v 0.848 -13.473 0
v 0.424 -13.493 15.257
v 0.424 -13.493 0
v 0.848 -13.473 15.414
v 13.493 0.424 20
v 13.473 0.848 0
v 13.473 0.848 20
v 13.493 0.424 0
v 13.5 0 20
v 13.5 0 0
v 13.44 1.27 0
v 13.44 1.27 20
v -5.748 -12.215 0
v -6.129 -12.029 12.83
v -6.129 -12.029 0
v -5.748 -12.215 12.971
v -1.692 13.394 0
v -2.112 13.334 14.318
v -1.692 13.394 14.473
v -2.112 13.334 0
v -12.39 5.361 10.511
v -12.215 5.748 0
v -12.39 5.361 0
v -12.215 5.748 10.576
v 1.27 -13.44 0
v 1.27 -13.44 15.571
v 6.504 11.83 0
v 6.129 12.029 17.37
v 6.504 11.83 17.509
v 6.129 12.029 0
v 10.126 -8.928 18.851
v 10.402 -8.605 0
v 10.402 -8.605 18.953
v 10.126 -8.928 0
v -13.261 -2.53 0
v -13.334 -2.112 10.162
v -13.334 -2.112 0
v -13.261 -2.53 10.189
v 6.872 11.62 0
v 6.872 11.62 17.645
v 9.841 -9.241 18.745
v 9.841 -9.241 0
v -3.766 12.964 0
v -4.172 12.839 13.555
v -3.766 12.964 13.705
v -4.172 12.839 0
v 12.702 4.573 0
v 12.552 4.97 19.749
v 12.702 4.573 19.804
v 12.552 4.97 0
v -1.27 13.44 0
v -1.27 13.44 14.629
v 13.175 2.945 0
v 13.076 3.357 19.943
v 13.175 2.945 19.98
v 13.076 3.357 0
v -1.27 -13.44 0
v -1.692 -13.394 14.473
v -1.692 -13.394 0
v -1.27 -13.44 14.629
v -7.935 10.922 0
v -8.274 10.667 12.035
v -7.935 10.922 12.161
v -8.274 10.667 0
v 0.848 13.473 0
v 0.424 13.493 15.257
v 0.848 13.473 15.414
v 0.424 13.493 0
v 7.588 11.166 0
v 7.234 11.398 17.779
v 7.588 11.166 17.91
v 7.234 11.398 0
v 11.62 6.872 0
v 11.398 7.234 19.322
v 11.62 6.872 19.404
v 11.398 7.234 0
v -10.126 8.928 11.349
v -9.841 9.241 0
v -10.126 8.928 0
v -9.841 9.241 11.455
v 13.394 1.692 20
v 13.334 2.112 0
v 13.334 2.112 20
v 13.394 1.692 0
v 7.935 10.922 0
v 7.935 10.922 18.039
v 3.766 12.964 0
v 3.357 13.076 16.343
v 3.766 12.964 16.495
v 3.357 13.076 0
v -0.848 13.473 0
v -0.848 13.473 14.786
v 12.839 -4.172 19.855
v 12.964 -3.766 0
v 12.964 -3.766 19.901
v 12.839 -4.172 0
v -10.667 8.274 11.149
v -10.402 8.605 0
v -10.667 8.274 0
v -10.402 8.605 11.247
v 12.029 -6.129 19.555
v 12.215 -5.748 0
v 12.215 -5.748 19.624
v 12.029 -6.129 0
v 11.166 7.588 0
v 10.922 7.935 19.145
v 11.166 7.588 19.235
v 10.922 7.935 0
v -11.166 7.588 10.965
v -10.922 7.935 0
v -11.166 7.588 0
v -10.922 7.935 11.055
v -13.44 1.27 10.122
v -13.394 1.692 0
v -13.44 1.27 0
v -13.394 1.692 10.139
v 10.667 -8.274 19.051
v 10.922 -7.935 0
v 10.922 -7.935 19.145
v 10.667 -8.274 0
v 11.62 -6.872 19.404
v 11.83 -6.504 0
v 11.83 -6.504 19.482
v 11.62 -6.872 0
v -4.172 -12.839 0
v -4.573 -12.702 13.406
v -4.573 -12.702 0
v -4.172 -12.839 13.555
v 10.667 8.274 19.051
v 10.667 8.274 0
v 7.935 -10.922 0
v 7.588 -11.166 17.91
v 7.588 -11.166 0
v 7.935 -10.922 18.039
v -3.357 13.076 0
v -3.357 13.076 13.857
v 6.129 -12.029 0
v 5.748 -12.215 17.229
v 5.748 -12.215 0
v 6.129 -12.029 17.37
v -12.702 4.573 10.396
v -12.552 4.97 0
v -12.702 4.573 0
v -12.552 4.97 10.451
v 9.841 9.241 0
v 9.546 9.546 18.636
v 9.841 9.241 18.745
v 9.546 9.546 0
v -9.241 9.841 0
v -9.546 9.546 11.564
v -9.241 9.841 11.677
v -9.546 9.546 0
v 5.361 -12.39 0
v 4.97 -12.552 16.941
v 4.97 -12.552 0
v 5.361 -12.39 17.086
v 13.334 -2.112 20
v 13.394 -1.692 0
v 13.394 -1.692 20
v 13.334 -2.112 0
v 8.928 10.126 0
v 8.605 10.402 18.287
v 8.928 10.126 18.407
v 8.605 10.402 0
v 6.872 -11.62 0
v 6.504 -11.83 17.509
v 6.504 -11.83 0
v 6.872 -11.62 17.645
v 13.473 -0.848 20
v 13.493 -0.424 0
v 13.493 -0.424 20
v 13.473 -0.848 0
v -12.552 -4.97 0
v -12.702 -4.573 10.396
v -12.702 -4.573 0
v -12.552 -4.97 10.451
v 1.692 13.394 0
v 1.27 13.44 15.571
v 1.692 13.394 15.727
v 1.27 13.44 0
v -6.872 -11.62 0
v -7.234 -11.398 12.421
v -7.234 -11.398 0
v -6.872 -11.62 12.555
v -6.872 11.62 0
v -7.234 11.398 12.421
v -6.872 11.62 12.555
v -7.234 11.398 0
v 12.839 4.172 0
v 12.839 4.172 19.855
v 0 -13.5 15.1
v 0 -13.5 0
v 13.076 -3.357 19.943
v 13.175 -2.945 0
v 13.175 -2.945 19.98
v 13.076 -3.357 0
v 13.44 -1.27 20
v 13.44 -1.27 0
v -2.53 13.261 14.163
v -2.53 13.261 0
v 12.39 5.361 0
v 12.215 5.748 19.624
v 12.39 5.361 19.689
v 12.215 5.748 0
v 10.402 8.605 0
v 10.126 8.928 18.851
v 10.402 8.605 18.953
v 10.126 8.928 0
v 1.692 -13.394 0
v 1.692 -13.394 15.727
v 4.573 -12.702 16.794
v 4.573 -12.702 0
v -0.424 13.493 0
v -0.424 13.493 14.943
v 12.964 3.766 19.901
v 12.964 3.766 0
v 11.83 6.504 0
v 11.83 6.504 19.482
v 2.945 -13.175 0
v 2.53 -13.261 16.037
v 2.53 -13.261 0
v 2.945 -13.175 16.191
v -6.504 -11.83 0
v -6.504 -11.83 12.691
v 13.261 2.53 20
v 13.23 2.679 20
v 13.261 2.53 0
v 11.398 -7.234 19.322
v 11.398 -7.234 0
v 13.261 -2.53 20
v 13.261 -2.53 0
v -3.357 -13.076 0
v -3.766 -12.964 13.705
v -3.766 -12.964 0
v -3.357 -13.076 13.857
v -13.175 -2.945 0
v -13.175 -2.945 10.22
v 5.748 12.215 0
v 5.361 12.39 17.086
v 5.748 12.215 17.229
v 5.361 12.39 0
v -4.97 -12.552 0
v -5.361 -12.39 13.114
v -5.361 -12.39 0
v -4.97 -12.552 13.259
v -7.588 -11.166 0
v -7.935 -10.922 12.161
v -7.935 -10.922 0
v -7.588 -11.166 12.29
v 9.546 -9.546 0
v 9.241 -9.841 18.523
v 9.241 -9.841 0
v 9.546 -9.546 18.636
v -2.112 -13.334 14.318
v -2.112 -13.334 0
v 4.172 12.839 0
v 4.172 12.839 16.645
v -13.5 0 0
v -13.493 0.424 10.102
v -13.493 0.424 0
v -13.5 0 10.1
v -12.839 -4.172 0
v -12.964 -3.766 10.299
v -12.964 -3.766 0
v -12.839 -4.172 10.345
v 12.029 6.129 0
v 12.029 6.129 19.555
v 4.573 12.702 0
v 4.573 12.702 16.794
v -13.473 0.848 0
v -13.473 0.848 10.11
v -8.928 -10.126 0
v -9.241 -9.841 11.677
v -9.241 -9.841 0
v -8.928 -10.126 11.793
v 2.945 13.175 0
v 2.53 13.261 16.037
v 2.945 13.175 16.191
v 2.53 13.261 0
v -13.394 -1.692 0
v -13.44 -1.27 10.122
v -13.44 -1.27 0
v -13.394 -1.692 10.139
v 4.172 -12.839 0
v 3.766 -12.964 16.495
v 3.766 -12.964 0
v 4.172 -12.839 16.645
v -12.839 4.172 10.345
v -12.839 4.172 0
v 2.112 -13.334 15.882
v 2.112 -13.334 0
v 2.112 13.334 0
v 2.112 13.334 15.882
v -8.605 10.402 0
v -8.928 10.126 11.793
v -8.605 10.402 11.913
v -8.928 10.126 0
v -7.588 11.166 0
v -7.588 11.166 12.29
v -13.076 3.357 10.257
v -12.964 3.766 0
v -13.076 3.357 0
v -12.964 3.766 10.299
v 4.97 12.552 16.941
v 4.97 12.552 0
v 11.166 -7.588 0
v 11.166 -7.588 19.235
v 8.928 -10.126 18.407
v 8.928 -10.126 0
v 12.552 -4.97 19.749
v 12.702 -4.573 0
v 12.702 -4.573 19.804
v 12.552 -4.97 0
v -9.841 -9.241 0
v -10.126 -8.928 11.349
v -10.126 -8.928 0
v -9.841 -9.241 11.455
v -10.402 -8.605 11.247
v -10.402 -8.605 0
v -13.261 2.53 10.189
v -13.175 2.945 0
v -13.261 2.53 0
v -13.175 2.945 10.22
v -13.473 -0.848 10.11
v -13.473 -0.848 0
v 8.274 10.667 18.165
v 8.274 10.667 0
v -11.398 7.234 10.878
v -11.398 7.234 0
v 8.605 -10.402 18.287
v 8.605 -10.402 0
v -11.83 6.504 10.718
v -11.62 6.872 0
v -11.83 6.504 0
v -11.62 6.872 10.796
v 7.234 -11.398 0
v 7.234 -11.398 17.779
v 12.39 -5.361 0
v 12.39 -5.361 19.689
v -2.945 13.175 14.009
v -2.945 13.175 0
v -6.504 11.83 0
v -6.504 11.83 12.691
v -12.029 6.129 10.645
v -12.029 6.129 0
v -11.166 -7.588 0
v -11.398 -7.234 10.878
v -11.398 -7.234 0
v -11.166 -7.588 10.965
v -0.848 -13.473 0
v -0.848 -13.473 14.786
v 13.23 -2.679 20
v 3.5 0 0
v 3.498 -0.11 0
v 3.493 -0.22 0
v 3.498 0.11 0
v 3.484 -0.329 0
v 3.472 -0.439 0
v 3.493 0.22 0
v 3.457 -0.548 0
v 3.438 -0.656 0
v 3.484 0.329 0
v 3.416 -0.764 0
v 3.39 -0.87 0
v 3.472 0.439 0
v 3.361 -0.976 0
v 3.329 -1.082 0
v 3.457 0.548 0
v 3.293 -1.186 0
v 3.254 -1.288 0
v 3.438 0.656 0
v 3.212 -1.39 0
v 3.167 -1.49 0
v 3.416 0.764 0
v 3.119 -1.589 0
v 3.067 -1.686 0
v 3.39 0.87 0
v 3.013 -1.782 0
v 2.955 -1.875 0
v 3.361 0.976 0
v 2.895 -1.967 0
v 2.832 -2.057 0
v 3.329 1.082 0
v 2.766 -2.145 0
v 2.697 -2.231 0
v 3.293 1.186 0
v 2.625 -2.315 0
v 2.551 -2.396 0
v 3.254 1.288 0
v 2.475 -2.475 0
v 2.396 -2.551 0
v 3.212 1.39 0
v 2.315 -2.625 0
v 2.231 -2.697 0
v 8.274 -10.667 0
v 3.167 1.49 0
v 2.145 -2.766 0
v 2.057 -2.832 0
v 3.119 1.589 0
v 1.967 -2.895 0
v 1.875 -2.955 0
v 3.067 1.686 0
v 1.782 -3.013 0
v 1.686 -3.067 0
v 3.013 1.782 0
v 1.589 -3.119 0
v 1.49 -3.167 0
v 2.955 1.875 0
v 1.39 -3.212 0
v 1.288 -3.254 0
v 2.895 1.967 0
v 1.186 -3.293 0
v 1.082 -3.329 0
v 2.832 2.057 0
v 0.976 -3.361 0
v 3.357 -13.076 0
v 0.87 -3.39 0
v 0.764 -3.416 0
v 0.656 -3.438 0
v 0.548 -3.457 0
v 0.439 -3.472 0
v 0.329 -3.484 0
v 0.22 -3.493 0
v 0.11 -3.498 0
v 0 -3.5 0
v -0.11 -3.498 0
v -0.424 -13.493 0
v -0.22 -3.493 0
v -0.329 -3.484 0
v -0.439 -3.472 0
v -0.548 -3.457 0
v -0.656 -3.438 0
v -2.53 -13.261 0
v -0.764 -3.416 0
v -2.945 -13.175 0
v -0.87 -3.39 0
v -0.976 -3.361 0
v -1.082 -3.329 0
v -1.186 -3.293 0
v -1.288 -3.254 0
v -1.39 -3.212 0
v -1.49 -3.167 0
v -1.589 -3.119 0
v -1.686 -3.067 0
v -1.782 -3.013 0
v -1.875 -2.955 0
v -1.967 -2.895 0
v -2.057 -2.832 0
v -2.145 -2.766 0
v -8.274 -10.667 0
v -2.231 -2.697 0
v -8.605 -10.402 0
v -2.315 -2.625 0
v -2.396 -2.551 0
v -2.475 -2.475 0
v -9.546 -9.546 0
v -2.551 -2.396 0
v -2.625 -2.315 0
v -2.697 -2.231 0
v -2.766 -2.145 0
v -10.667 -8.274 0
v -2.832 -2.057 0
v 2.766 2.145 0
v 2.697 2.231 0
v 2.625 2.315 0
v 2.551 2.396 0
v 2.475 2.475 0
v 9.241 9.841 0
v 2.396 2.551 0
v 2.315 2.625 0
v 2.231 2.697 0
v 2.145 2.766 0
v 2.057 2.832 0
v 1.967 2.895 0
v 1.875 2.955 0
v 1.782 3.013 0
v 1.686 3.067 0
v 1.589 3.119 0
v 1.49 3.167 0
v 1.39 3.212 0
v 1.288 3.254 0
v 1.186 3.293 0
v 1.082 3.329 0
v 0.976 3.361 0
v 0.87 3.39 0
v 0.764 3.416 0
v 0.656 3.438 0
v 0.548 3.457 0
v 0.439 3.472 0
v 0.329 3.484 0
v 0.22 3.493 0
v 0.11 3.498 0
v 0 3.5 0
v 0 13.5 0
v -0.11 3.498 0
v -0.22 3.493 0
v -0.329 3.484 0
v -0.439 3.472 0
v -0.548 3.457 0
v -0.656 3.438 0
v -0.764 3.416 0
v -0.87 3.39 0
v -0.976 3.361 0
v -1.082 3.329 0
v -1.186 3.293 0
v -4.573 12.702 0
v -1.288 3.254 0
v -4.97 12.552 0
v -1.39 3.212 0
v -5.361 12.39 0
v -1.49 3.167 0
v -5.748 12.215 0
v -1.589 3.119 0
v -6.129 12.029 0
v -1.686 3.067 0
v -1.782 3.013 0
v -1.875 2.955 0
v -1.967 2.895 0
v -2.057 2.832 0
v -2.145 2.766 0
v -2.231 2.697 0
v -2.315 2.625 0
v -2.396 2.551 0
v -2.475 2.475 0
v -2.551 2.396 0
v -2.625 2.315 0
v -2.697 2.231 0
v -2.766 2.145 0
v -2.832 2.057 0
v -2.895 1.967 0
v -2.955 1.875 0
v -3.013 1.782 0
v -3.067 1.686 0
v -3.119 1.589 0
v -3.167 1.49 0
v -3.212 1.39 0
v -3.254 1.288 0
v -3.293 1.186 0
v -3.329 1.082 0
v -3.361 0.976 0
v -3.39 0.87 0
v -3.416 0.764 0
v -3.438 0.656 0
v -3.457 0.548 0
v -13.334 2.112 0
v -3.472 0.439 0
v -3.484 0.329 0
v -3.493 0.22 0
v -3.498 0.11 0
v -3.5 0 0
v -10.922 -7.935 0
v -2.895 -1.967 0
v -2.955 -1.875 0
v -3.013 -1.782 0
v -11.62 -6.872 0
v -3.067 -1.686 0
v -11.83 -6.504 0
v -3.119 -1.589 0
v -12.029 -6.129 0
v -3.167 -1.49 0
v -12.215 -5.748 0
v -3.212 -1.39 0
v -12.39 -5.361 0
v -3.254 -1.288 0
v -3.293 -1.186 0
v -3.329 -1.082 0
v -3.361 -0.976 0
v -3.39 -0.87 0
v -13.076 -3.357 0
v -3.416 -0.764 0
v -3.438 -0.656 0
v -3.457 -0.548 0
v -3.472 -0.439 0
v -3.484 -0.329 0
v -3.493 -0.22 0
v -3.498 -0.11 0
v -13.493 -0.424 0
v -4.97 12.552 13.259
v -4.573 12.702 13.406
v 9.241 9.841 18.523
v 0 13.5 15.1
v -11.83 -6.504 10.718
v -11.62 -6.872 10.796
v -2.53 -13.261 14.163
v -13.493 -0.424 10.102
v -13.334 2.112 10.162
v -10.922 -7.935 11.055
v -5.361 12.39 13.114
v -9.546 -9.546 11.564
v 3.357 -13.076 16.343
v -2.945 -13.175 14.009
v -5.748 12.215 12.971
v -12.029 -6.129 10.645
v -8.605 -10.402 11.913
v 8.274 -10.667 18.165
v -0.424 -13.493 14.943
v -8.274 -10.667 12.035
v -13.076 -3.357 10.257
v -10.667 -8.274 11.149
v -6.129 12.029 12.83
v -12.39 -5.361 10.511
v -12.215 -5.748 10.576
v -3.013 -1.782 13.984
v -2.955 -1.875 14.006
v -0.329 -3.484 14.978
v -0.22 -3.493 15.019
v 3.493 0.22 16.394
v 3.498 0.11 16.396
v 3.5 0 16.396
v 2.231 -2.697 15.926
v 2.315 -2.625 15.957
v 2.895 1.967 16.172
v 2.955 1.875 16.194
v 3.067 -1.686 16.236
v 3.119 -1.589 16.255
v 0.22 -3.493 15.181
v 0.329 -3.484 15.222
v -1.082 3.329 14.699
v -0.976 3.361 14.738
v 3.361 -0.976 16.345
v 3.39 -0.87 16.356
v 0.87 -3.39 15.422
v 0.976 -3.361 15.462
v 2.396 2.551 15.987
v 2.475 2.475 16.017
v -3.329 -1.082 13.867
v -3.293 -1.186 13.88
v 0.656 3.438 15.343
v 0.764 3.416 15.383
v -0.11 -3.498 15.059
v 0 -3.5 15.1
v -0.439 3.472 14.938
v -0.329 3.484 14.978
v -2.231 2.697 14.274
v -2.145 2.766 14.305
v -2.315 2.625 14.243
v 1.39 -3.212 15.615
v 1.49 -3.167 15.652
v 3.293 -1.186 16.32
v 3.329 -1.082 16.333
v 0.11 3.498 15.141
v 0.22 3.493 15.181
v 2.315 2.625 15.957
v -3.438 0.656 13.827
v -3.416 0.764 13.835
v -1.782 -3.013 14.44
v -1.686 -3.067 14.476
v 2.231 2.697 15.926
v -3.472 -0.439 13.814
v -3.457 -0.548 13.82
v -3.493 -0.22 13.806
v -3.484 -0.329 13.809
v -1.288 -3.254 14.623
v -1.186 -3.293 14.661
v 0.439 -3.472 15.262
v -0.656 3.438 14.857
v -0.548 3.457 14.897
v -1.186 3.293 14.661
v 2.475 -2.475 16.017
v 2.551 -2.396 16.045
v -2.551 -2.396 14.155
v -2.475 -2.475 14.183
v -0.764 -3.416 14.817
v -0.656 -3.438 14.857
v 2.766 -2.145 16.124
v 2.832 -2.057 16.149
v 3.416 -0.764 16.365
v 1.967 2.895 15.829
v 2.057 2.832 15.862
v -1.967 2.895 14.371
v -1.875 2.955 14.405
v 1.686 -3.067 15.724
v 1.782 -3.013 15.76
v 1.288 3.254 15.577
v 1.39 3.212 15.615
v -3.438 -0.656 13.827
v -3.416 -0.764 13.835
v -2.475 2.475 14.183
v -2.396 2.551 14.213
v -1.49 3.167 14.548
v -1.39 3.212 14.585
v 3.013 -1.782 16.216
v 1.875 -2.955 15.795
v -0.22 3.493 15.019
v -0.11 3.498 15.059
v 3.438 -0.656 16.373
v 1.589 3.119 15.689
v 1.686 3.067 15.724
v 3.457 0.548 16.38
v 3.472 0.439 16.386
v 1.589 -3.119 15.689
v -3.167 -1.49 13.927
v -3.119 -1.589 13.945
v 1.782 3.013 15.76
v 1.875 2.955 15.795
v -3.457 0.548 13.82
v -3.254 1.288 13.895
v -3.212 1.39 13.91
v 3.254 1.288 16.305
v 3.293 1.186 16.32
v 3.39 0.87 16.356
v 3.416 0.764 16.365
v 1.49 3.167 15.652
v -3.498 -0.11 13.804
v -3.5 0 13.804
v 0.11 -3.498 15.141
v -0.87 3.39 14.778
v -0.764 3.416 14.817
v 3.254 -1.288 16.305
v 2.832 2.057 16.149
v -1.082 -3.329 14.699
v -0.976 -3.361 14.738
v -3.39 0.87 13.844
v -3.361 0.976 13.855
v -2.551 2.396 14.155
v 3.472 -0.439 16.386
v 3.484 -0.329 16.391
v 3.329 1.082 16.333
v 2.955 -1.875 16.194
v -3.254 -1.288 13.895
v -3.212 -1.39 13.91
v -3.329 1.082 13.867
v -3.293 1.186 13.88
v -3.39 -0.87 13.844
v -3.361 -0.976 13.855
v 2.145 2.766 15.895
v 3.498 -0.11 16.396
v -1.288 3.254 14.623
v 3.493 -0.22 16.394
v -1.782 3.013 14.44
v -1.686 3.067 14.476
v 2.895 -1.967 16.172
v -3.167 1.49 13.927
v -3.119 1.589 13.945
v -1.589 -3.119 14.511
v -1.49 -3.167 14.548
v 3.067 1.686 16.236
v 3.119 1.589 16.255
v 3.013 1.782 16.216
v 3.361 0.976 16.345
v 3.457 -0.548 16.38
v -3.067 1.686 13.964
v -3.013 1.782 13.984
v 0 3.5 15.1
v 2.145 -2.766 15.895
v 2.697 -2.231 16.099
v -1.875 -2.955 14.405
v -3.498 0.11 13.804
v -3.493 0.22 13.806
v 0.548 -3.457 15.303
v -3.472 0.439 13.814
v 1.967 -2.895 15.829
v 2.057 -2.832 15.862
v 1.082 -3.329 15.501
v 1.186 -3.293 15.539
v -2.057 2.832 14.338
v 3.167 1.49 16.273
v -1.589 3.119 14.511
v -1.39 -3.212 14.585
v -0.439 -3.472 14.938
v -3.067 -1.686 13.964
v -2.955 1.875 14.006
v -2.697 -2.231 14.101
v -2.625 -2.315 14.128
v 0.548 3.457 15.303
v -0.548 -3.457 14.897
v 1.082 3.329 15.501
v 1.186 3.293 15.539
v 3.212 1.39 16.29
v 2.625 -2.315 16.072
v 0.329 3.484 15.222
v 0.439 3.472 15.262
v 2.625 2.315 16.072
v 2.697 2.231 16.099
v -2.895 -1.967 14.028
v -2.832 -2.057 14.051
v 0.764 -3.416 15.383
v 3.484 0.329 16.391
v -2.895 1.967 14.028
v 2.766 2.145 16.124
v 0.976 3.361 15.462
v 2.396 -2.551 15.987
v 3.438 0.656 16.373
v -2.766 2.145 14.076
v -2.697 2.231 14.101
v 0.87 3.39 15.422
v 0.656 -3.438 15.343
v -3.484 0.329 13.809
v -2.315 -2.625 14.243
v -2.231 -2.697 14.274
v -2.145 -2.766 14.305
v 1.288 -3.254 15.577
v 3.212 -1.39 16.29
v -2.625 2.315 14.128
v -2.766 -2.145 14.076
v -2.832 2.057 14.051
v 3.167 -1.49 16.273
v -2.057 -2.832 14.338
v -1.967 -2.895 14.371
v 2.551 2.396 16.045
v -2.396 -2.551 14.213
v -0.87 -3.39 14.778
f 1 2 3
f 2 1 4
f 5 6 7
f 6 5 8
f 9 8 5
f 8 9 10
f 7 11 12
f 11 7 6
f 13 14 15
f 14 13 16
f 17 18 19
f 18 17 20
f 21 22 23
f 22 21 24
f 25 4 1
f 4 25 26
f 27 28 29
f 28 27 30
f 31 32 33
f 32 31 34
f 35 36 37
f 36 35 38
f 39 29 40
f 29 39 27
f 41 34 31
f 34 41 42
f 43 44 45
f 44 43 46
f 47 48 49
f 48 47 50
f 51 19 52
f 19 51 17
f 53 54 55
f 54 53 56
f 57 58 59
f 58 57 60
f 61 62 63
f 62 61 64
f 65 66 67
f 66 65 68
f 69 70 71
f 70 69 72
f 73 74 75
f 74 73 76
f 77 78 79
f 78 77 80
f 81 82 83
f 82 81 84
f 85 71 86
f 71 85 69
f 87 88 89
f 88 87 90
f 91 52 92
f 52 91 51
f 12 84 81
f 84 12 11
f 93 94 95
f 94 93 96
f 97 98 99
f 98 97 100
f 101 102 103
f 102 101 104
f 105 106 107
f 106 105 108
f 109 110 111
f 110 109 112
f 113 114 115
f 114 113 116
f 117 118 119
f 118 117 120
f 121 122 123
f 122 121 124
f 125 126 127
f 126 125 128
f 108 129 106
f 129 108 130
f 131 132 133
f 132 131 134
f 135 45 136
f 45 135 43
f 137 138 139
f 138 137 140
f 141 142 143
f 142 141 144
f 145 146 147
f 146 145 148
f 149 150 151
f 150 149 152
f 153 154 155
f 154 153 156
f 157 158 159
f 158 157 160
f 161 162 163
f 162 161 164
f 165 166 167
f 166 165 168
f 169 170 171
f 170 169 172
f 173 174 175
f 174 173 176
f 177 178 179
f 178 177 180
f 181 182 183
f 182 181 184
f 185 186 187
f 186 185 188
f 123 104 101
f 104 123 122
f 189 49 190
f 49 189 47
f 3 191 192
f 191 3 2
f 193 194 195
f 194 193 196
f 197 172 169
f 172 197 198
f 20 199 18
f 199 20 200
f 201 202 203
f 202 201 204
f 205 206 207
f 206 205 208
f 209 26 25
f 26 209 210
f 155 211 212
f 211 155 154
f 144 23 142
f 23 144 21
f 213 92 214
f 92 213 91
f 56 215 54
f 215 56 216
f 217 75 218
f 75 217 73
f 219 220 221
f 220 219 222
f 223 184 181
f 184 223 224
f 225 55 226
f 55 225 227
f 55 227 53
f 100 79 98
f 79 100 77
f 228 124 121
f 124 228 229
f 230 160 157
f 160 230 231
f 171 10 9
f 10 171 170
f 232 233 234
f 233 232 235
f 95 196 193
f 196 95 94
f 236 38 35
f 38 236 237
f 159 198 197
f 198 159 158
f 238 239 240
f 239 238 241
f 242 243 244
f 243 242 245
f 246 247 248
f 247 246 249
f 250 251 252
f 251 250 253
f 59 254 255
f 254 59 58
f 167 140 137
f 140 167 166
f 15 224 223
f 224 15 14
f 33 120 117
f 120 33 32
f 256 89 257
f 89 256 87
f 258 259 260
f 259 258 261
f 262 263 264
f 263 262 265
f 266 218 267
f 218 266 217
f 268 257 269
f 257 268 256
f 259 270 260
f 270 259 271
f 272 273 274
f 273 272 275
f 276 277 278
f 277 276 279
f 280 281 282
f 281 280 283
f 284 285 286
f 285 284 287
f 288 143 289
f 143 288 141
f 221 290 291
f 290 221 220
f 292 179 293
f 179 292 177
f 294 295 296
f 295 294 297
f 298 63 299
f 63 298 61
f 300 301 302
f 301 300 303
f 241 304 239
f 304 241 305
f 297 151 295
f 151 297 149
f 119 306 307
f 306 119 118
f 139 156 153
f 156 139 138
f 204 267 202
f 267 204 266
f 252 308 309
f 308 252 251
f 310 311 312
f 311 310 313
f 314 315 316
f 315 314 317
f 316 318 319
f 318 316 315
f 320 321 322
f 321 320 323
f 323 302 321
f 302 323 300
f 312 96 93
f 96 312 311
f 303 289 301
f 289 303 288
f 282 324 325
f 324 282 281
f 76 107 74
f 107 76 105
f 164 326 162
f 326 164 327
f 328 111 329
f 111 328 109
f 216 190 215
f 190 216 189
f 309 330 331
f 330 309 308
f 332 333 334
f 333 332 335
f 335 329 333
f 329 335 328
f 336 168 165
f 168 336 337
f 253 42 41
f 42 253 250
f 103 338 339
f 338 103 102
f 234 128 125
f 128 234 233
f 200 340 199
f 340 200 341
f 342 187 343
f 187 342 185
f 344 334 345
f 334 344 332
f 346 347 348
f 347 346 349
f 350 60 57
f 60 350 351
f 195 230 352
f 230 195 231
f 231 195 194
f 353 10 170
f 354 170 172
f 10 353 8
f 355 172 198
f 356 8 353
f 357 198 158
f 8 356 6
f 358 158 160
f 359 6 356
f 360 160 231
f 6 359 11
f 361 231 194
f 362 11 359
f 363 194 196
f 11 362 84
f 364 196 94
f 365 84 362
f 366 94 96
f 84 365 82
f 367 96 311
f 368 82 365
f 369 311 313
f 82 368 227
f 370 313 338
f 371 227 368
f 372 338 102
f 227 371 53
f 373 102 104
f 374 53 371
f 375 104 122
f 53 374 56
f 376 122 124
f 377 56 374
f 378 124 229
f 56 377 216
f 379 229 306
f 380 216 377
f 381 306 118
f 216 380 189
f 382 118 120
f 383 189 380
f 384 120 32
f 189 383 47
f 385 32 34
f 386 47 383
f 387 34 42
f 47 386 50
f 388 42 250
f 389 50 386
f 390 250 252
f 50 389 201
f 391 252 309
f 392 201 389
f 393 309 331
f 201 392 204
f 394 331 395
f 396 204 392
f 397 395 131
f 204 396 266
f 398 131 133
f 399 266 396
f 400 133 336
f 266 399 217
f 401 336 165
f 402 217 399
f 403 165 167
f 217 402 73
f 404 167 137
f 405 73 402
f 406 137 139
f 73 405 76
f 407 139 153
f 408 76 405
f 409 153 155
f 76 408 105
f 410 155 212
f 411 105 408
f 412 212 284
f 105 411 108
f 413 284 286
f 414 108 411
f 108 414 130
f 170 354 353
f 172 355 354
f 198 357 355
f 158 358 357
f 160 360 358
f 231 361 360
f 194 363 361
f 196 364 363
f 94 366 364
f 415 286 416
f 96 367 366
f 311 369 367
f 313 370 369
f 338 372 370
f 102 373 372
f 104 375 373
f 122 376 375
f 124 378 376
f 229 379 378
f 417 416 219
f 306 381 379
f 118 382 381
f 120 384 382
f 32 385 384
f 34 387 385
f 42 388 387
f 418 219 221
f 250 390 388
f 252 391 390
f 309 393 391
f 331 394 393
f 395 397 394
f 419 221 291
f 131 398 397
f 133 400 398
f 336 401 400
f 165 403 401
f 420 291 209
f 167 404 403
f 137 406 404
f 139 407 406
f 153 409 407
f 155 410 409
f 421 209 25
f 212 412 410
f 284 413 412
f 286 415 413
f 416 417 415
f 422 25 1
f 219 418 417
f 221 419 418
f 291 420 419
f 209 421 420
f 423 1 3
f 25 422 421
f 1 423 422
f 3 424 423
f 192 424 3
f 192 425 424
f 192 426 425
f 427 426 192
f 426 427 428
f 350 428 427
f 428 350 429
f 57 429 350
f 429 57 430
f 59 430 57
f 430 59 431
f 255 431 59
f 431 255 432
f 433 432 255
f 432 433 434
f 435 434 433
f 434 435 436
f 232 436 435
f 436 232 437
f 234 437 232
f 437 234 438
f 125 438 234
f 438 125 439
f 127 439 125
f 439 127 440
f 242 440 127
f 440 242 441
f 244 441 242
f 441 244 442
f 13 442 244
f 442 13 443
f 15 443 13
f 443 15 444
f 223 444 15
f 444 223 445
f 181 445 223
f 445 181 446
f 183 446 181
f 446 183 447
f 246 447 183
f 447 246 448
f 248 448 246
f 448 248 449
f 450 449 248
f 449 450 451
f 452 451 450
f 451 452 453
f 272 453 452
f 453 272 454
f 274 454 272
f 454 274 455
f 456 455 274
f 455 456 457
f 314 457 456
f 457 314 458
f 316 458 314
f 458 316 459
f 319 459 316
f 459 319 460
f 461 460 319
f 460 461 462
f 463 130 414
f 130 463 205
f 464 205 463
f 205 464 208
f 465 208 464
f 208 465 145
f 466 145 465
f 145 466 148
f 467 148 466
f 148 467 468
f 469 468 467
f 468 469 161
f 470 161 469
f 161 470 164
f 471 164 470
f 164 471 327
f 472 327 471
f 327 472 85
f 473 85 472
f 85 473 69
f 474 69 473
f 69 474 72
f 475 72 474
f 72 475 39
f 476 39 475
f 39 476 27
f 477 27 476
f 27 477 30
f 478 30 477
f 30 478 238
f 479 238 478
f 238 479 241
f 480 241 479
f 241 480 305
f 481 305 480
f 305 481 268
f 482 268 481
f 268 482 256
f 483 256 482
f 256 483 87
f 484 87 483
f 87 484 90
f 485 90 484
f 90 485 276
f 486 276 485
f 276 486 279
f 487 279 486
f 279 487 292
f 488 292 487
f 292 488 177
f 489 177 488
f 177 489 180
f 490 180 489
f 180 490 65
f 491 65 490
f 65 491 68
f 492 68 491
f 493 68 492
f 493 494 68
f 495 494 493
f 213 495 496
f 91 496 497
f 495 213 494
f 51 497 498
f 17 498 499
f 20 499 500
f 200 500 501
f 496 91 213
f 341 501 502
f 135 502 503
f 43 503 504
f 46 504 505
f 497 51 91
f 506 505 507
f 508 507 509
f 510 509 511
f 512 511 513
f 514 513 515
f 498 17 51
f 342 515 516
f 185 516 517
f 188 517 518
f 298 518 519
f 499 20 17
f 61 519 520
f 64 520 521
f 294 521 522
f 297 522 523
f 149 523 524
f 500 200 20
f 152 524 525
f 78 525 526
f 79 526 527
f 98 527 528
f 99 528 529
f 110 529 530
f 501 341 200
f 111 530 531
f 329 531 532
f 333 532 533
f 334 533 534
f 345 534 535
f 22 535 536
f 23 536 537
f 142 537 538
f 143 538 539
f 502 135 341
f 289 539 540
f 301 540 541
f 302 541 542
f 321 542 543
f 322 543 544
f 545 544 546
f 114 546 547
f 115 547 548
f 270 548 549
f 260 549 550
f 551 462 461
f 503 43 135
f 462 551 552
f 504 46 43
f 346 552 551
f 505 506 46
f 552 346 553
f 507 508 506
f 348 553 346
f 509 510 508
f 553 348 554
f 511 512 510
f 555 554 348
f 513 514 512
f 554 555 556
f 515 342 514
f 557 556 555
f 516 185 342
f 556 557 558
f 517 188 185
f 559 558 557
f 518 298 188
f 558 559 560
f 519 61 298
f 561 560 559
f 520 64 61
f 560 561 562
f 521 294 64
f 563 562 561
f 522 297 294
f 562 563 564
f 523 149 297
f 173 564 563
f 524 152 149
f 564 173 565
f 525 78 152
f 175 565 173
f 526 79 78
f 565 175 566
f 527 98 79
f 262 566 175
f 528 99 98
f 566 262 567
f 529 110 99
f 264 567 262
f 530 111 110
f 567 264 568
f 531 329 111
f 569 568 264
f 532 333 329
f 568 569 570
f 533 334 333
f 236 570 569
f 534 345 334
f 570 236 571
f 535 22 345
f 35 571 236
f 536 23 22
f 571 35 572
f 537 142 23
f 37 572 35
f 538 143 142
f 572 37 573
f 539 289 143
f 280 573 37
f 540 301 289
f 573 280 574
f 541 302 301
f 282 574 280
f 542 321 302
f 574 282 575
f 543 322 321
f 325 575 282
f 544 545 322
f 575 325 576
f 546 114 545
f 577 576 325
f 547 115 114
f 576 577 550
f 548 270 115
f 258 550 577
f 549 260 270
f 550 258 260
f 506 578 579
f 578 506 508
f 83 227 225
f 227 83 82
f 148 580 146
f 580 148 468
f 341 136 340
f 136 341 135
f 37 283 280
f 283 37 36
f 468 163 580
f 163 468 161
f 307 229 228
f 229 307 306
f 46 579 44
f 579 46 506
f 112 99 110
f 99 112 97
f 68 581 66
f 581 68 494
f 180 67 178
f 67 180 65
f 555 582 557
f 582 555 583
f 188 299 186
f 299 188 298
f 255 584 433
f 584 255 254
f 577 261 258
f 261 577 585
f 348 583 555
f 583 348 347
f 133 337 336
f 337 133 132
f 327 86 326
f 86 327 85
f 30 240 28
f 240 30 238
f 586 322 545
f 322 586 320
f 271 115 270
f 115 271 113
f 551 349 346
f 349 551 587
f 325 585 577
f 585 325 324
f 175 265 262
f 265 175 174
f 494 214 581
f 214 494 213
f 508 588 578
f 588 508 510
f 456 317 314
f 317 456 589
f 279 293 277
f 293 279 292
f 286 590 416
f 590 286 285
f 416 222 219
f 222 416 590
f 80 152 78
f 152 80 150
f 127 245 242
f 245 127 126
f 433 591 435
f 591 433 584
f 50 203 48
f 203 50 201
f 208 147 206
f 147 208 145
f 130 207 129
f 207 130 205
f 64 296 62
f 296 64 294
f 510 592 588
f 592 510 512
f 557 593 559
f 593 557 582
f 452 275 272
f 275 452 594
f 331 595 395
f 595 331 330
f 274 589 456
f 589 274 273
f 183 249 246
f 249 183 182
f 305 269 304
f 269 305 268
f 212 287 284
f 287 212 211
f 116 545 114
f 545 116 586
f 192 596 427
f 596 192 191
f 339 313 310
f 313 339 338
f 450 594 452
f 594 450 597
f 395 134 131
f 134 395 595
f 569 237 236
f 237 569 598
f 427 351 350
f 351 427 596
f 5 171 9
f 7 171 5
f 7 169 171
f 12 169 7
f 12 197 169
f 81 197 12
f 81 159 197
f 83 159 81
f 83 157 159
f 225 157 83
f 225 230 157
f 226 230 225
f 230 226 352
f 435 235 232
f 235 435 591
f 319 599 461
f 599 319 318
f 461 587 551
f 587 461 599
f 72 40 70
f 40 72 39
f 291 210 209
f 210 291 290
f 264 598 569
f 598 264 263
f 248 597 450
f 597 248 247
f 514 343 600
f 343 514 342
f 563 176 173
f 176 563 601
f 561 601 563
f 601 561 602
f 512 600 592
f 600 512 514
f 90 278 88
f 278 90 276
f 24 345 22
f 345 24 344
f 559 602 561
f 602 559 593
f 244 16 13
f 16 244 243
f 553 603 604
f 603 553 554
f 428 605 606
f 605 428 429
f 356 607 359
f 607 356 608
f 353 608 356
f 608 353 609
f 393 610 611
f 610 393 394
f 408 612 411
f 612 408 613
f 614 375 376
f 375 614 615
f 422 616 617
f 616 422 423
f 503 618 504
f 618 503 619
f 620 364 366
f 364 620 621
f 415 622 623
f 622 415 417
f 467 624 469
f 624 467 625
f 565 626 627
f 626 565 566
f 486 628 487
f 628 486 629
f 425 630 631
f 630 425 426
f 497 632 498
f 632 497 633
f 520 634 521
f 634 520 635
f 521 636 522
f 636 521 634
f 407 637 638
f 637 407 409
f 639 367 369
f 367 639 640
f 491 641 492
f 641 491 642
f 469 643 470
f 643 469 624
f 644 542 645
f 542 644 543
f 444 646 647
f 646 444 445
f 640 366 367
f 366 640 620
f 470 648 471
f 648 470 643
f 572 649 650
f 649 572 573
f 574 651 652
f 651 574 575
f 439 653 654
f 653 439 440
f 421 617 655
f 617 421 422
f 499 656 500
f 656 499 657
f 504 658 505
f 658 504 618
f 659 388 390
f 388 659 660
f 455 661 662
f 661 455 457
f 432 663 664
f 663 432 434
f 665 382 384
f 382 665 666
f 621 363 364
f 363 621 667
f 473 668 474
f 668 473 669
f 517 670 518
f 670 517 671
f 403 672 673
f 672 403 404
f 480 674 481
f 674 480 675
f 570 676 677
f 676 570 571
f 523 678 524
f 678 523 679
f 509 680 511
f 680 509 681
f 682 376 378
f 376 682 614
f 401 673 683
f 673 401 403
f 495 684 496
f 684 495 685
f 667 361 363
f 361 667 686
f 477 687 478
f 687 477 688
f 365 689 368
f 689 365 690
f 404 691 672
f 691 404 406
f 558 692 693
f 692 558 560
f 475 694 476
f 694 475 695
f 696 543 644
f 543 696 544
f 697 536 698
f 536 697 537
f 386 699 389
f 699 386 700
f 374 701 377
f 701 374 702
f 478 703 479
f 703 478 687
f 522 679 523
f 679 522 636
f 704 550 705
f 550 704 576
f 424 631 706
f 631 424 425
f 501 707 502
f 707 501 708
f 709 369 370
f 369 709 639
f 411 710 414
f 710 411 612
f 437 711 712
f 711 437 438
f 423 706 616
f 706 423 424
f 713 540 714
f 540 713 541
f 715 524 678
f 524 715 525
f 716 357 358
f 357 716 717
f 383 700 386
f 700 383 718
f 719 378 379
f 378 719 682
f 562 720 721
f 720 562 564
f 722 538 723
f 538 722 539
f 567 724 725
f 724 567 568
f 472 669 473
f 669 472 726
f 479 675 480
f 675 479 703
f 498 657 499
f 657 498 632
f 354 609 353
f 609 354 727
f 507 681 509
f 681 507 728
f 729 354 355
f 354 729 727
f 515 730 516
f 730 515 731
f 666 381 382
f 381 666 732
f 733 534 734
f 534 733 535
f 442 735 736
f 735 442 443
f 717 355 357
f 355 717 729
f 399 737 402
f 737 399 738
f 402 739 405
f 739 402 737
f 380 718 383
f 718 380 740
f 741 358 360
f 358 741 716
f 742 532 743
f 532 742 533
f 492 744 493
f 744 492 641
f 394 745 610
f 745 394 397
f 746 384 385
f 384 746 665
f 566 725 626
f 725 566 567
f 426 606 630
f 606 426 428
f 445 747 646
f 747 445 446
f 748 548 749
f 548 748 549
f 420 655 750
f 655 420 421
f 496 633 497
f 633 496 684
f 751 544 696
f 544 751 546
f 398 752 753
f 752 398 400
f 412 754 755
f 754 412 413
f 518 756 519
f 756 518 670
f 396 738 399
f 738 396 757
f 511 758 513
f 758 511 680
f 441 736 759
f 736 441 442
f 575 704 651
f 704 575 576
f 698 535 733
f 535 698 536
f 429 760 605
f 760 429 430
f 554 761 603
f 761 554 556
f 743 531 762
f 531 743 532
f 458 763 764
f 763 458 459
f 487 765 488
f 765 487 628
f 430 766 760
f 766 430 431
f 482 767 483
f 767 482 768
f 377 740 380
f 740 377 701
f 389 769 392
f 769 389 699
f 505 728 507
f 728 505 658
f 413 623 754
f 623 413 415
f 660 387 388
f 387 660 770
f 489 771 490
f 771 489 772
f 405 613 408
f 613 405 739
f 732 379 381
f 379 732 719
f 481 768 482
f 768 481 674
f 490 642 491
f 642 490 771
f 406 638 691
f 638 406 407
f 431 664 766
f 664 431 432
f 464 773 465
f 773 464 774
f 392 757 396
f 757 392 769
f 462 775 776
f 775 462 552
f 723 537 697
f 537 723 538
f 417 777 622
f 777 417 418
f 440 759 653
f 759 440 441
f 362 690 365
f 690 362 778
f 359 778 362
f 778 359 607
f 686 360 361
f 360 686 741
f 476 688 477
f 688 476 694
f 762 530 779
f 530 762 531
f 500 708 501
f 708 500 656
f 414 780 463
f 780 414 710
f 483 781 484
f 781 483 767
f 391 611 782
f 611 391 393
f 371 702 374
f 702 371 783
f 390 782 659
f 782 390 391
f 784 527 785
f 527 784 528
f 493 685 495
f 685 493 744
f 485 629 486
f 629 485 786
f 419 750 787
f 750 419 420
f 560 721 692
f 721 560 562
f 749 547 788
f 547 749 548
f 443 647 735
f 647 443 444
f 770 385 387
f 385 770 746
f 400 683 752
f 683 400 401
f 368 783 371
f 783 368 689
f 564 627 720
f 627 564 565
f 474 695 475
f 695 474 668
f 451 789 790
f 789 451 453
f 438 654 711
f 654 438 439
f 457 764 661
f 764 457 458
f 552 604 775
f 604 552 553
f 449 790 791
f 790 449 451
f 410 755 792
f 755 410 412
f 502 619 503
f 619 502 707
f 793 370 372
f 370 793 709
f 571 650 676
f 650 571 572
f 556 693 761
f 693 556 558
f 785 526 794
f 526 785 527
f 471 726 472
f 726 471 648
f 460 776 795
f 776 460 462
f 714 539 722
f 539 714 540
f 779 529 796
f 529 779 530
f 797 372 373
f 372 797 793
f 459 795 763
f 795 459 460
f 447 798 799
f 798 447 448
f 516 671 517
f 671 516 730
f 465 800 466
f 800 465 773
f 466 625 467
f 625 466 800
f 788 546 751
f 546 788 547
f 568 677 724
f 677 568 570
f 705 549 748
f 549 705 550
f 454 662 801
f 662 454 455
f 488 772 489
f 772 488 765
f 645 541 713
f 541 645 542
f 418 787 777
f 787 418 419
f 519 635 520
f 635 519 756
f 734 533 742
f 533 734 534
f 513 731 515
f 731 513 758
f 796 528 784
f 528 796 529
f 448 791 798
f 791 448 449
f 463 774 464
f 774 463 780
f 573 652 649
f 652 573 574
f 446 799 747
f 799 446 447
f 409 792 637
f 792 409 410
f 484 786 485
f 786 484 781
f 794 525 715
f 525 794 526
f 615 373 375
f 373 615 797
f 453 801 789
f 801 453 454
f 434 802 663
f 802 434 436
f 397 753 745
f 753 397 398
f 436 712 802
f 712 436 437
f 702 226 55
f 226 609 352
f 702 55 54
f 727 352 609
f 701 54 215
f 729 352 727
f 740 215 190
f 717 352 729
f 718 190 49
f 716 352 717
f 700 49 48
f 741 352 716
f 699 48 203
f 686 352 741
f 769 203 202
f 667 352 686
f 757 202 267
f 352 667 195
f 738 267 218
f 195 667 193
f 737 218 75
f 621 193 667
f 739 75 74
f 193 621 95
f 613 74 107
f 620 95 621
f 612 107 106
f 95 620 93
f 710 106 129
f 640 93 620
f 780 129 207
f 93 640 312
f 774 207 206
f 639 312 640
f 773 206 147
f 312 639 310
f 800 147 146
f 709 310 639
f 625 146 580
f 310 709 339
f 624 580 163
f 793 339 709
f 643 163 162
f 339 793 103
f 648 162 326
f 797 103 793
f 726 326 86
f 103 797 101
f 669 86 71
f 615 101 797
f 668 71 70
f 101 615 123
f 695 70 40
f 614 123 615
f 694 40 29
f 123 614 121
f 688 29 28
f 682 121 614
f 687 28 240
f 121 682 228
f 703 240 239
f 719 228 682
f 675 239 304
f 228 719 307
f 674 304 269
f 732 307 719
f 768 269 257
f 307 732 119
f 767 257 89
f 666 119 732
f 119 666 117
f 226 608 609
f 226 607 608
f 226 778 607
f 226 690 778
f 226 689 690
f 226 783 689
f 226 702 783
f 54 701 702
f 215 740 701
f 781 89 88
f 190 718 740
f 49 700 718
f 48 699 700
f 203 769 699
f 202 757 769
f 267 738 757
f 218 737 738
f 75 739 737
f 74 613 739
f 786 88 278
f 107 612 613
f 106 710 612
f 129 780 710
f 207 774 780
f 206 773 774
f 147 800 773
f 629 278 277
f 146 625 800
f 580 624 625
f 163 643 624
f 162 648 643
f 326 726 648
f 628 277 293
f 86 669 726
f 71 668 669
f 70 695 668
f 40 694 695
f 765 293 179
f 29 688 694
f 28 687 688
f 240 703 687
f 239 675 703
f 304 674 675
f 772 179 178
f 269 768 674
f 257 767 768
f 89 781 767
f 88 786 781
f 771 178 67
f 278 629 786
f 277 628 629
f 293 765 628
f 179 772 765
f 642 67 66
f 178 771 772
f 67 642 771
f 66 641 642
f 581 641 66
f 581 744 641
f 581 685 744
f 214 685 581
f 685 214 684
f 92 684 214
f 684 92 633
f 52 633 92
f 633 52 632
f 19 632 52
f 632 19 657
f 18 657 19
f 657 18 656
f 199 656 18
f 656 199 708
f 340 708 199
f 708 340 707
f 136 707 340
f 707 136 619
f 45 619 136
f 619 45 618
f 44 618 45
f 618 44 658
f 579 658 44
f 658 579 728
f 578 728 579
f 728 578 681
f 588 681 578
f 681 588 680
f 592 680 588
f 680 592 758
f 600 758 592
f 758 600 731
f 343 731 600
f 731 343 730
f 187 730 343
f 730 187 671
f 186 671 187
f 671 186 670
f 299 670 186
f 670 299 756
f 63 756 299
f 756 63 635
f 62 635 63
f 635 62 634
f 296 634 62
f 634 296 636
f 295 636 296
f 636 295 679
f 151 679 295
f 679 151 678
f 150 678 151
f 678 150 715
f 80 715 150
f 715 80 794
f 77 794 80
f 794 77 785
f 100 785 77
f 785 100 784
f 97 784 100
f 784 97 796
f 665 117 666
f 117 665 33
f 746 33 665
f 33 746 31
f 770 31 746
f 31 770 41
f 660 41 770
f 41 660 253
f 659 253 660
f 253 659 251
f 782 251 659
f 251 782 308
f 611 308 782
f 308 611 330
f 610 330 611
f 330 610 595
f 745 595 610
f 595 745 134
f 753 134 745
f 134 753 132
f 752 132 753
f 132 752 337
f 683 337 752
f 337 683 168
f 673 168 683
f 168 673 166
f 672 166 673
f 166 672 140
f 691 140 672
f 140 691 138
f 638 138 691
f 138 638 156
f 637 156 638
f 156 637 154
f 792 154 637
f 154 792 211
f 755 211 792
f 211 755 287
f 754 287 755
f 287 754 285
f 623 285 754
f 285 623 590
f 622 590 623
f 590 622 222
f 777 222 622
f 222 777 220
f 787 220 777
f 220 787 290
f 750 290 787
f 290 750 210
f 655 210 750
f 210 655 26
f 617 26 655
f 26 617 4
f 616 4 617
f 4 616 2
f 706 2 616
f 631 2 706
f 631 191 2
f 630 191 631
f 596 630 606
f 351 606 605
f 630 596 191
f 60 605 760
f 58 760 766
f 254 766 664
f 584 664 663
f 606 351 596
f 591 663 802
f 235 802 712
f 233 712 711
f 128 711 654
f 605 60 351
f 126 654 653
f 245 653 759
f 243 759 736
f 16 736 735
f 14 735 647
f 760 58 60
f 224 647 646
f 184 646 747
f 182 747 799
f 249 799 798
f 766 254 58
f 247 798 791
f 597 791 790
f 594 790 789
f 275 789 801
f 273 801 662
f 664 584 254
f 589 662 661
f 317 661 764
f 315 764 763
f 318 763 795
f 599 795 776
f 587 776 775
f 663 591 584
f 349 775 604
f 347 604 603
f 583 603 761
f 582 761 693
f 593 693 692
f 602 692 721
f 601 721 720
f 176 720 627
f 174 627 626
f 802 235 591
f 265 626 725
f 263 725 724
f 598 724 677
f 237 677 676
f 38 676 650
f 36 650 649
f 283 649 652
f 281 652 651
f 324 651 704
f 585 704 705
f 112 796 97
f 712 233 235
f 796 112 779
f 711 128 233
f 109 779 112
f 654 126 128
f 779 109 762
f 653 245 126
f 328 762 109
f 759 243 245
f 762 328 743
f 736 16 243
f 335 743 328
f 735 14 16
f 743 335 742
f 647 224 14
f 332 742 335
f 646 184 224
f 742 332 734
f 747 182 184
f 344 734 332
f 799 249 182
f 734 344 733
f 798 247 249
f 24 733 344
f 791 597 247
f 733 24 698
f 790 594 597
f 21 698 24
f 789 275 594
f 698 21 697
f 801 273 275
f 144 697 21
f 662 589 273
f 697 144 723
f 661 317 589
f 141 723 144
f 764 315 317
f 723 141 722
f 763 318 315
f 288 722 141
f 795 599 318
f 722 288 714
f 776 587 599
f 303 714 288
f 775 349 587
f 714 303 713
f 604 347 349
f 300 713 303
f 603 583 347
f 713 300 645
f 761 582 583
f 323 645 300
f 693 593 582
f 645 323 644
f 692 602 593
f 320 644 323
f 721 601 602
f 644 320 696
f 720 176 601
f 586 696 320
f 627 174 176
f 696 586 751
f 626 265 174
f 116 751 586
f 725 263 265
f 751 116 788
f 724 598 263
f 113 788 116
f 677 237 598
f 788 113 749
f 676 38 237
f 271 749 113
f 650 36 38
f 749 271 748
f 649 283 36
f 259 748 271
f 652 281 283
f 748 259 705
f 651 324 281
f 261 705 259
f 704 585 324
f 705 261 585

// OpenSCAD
/*
 * file: doorstop-adapter.scad
 * author: gregor binder <gregor_reprap@catrix.at>
 * date: 14.11.2013
 * last change: 14.11.2013
 * license: CC BY-NC-SA 3.0
 */

height1=20;
height2=10;
outterdiameter=27;
innerdiameter=7;
$fn=200;

/****************/

module shim(shimwidth,shimlength,shimdepth) {
	linear_extrude(height = shimdepth, center = true)
	polygon(points=[[0,0],[shimwidth,0],[shimwidth,shimlength]],paths=[ [0,1,2] ]);
}

difference() {
	cylinder(h=height1, r=outterdiameter/2);
	translate([0,0,(height1/2)])
		cylinder(h=(height1)+2, r=innerdiameter/2, center=true);
	translate([outterdiameter/2,0,height1+0.1])
		rotate([90,180,0])
			shim(outterdiameter,height2,outterdiameter);
}
